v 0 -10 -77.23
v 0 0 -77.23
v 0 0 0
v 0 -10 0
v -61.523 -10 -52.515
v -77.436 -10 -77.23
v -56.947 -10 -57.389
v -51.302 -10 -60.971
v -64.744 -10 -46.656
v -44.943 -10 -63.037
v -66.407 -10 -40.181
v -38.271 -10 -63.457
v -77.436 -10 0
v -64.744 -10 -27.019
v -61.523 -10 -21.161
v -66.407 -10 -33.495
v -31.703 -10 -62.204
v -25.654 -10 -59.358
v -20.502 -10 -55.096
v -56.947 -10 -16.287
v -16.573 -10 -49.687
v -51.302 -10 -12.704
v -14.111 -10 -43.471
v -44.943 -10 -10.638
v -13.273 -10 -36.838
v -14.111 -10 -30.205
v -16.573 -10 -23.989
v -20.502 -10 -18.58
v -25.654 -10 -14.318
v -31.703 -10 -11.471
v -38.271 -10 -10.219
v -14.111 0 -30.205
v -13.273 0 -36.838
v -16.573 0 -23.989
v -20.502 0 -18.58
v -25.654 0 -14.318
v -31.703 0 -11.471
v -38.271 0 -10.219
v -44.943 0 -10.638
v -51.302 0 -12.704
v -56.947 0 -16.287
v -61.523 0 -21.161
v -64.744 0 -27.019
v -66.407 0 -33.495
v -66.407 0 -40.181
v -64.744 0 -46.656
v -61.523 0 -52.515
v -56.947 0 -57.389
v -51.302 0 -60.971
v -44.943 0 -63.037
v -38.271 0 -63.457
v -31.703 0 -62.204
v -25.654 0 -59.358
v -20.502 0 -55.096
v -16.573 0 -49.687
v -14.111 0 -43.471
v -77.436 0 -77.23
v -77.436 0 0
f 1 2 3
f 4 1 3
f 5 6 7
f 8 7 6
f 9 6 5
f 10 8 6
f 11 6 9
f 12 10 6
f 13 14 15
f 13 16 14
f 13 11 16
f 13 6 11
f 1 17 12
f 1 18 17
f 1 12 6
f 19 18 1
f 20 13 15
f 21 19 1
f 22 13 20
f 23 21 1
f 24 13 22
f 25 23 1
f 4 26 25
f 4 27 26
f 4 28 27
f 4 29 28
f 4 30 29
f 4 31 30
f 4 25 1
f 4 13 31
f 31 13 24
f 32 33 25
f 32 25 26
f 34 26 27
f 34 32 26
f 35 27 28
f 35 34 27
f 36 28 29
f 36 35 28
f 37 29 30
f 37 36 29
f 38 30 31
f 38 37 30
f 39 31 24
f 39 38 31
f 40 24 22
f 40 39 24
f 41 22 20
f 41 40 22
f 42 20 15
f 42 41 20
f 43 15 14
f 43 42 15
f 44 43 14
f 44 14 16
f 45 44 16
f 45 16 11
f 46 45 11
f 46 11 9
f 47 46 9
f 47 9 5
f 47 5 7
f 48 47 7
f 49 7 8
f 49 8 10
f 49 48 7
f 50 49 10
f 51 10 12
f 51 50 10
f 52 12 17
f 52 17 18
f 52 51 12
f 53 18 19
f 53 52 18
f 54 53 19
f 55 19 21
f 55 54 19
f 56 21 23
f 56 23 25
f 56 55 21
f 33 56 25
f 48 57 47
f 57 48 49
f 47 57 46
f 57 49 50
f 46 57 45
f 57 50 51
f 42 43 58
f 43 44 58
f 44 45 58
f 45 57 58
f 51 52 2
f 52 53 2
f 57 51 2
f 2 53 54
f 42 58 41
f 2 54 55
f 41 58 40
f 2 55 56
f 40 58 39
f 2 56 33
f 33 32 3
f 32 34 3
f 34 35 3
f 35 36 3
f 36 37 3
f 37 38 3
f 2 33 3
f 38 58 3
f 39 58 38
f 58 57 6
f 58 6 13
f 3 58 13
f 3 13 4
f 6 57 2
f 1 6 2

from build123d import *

# Parameters (mm, degrees)
F1_W     = 77.435985
F1_H     = 77.229559
F1_R     = 26.671877
F2_DEPTH = 10


with BuildPart() as f2:
    # F1 (on face) → F2 (new body)
    with BuildSketch(Plane.XZ):
        with Locations((-38.717993, -38.614779)):
            Rectangle(F1_W, F1_H)
        with Locations((-39.945371, -36.837861)):
            Circle(F1_R, mode=Mode.SUBTRACT)
    extrude(amount=F2_DEPTH)


solid = f2.part
